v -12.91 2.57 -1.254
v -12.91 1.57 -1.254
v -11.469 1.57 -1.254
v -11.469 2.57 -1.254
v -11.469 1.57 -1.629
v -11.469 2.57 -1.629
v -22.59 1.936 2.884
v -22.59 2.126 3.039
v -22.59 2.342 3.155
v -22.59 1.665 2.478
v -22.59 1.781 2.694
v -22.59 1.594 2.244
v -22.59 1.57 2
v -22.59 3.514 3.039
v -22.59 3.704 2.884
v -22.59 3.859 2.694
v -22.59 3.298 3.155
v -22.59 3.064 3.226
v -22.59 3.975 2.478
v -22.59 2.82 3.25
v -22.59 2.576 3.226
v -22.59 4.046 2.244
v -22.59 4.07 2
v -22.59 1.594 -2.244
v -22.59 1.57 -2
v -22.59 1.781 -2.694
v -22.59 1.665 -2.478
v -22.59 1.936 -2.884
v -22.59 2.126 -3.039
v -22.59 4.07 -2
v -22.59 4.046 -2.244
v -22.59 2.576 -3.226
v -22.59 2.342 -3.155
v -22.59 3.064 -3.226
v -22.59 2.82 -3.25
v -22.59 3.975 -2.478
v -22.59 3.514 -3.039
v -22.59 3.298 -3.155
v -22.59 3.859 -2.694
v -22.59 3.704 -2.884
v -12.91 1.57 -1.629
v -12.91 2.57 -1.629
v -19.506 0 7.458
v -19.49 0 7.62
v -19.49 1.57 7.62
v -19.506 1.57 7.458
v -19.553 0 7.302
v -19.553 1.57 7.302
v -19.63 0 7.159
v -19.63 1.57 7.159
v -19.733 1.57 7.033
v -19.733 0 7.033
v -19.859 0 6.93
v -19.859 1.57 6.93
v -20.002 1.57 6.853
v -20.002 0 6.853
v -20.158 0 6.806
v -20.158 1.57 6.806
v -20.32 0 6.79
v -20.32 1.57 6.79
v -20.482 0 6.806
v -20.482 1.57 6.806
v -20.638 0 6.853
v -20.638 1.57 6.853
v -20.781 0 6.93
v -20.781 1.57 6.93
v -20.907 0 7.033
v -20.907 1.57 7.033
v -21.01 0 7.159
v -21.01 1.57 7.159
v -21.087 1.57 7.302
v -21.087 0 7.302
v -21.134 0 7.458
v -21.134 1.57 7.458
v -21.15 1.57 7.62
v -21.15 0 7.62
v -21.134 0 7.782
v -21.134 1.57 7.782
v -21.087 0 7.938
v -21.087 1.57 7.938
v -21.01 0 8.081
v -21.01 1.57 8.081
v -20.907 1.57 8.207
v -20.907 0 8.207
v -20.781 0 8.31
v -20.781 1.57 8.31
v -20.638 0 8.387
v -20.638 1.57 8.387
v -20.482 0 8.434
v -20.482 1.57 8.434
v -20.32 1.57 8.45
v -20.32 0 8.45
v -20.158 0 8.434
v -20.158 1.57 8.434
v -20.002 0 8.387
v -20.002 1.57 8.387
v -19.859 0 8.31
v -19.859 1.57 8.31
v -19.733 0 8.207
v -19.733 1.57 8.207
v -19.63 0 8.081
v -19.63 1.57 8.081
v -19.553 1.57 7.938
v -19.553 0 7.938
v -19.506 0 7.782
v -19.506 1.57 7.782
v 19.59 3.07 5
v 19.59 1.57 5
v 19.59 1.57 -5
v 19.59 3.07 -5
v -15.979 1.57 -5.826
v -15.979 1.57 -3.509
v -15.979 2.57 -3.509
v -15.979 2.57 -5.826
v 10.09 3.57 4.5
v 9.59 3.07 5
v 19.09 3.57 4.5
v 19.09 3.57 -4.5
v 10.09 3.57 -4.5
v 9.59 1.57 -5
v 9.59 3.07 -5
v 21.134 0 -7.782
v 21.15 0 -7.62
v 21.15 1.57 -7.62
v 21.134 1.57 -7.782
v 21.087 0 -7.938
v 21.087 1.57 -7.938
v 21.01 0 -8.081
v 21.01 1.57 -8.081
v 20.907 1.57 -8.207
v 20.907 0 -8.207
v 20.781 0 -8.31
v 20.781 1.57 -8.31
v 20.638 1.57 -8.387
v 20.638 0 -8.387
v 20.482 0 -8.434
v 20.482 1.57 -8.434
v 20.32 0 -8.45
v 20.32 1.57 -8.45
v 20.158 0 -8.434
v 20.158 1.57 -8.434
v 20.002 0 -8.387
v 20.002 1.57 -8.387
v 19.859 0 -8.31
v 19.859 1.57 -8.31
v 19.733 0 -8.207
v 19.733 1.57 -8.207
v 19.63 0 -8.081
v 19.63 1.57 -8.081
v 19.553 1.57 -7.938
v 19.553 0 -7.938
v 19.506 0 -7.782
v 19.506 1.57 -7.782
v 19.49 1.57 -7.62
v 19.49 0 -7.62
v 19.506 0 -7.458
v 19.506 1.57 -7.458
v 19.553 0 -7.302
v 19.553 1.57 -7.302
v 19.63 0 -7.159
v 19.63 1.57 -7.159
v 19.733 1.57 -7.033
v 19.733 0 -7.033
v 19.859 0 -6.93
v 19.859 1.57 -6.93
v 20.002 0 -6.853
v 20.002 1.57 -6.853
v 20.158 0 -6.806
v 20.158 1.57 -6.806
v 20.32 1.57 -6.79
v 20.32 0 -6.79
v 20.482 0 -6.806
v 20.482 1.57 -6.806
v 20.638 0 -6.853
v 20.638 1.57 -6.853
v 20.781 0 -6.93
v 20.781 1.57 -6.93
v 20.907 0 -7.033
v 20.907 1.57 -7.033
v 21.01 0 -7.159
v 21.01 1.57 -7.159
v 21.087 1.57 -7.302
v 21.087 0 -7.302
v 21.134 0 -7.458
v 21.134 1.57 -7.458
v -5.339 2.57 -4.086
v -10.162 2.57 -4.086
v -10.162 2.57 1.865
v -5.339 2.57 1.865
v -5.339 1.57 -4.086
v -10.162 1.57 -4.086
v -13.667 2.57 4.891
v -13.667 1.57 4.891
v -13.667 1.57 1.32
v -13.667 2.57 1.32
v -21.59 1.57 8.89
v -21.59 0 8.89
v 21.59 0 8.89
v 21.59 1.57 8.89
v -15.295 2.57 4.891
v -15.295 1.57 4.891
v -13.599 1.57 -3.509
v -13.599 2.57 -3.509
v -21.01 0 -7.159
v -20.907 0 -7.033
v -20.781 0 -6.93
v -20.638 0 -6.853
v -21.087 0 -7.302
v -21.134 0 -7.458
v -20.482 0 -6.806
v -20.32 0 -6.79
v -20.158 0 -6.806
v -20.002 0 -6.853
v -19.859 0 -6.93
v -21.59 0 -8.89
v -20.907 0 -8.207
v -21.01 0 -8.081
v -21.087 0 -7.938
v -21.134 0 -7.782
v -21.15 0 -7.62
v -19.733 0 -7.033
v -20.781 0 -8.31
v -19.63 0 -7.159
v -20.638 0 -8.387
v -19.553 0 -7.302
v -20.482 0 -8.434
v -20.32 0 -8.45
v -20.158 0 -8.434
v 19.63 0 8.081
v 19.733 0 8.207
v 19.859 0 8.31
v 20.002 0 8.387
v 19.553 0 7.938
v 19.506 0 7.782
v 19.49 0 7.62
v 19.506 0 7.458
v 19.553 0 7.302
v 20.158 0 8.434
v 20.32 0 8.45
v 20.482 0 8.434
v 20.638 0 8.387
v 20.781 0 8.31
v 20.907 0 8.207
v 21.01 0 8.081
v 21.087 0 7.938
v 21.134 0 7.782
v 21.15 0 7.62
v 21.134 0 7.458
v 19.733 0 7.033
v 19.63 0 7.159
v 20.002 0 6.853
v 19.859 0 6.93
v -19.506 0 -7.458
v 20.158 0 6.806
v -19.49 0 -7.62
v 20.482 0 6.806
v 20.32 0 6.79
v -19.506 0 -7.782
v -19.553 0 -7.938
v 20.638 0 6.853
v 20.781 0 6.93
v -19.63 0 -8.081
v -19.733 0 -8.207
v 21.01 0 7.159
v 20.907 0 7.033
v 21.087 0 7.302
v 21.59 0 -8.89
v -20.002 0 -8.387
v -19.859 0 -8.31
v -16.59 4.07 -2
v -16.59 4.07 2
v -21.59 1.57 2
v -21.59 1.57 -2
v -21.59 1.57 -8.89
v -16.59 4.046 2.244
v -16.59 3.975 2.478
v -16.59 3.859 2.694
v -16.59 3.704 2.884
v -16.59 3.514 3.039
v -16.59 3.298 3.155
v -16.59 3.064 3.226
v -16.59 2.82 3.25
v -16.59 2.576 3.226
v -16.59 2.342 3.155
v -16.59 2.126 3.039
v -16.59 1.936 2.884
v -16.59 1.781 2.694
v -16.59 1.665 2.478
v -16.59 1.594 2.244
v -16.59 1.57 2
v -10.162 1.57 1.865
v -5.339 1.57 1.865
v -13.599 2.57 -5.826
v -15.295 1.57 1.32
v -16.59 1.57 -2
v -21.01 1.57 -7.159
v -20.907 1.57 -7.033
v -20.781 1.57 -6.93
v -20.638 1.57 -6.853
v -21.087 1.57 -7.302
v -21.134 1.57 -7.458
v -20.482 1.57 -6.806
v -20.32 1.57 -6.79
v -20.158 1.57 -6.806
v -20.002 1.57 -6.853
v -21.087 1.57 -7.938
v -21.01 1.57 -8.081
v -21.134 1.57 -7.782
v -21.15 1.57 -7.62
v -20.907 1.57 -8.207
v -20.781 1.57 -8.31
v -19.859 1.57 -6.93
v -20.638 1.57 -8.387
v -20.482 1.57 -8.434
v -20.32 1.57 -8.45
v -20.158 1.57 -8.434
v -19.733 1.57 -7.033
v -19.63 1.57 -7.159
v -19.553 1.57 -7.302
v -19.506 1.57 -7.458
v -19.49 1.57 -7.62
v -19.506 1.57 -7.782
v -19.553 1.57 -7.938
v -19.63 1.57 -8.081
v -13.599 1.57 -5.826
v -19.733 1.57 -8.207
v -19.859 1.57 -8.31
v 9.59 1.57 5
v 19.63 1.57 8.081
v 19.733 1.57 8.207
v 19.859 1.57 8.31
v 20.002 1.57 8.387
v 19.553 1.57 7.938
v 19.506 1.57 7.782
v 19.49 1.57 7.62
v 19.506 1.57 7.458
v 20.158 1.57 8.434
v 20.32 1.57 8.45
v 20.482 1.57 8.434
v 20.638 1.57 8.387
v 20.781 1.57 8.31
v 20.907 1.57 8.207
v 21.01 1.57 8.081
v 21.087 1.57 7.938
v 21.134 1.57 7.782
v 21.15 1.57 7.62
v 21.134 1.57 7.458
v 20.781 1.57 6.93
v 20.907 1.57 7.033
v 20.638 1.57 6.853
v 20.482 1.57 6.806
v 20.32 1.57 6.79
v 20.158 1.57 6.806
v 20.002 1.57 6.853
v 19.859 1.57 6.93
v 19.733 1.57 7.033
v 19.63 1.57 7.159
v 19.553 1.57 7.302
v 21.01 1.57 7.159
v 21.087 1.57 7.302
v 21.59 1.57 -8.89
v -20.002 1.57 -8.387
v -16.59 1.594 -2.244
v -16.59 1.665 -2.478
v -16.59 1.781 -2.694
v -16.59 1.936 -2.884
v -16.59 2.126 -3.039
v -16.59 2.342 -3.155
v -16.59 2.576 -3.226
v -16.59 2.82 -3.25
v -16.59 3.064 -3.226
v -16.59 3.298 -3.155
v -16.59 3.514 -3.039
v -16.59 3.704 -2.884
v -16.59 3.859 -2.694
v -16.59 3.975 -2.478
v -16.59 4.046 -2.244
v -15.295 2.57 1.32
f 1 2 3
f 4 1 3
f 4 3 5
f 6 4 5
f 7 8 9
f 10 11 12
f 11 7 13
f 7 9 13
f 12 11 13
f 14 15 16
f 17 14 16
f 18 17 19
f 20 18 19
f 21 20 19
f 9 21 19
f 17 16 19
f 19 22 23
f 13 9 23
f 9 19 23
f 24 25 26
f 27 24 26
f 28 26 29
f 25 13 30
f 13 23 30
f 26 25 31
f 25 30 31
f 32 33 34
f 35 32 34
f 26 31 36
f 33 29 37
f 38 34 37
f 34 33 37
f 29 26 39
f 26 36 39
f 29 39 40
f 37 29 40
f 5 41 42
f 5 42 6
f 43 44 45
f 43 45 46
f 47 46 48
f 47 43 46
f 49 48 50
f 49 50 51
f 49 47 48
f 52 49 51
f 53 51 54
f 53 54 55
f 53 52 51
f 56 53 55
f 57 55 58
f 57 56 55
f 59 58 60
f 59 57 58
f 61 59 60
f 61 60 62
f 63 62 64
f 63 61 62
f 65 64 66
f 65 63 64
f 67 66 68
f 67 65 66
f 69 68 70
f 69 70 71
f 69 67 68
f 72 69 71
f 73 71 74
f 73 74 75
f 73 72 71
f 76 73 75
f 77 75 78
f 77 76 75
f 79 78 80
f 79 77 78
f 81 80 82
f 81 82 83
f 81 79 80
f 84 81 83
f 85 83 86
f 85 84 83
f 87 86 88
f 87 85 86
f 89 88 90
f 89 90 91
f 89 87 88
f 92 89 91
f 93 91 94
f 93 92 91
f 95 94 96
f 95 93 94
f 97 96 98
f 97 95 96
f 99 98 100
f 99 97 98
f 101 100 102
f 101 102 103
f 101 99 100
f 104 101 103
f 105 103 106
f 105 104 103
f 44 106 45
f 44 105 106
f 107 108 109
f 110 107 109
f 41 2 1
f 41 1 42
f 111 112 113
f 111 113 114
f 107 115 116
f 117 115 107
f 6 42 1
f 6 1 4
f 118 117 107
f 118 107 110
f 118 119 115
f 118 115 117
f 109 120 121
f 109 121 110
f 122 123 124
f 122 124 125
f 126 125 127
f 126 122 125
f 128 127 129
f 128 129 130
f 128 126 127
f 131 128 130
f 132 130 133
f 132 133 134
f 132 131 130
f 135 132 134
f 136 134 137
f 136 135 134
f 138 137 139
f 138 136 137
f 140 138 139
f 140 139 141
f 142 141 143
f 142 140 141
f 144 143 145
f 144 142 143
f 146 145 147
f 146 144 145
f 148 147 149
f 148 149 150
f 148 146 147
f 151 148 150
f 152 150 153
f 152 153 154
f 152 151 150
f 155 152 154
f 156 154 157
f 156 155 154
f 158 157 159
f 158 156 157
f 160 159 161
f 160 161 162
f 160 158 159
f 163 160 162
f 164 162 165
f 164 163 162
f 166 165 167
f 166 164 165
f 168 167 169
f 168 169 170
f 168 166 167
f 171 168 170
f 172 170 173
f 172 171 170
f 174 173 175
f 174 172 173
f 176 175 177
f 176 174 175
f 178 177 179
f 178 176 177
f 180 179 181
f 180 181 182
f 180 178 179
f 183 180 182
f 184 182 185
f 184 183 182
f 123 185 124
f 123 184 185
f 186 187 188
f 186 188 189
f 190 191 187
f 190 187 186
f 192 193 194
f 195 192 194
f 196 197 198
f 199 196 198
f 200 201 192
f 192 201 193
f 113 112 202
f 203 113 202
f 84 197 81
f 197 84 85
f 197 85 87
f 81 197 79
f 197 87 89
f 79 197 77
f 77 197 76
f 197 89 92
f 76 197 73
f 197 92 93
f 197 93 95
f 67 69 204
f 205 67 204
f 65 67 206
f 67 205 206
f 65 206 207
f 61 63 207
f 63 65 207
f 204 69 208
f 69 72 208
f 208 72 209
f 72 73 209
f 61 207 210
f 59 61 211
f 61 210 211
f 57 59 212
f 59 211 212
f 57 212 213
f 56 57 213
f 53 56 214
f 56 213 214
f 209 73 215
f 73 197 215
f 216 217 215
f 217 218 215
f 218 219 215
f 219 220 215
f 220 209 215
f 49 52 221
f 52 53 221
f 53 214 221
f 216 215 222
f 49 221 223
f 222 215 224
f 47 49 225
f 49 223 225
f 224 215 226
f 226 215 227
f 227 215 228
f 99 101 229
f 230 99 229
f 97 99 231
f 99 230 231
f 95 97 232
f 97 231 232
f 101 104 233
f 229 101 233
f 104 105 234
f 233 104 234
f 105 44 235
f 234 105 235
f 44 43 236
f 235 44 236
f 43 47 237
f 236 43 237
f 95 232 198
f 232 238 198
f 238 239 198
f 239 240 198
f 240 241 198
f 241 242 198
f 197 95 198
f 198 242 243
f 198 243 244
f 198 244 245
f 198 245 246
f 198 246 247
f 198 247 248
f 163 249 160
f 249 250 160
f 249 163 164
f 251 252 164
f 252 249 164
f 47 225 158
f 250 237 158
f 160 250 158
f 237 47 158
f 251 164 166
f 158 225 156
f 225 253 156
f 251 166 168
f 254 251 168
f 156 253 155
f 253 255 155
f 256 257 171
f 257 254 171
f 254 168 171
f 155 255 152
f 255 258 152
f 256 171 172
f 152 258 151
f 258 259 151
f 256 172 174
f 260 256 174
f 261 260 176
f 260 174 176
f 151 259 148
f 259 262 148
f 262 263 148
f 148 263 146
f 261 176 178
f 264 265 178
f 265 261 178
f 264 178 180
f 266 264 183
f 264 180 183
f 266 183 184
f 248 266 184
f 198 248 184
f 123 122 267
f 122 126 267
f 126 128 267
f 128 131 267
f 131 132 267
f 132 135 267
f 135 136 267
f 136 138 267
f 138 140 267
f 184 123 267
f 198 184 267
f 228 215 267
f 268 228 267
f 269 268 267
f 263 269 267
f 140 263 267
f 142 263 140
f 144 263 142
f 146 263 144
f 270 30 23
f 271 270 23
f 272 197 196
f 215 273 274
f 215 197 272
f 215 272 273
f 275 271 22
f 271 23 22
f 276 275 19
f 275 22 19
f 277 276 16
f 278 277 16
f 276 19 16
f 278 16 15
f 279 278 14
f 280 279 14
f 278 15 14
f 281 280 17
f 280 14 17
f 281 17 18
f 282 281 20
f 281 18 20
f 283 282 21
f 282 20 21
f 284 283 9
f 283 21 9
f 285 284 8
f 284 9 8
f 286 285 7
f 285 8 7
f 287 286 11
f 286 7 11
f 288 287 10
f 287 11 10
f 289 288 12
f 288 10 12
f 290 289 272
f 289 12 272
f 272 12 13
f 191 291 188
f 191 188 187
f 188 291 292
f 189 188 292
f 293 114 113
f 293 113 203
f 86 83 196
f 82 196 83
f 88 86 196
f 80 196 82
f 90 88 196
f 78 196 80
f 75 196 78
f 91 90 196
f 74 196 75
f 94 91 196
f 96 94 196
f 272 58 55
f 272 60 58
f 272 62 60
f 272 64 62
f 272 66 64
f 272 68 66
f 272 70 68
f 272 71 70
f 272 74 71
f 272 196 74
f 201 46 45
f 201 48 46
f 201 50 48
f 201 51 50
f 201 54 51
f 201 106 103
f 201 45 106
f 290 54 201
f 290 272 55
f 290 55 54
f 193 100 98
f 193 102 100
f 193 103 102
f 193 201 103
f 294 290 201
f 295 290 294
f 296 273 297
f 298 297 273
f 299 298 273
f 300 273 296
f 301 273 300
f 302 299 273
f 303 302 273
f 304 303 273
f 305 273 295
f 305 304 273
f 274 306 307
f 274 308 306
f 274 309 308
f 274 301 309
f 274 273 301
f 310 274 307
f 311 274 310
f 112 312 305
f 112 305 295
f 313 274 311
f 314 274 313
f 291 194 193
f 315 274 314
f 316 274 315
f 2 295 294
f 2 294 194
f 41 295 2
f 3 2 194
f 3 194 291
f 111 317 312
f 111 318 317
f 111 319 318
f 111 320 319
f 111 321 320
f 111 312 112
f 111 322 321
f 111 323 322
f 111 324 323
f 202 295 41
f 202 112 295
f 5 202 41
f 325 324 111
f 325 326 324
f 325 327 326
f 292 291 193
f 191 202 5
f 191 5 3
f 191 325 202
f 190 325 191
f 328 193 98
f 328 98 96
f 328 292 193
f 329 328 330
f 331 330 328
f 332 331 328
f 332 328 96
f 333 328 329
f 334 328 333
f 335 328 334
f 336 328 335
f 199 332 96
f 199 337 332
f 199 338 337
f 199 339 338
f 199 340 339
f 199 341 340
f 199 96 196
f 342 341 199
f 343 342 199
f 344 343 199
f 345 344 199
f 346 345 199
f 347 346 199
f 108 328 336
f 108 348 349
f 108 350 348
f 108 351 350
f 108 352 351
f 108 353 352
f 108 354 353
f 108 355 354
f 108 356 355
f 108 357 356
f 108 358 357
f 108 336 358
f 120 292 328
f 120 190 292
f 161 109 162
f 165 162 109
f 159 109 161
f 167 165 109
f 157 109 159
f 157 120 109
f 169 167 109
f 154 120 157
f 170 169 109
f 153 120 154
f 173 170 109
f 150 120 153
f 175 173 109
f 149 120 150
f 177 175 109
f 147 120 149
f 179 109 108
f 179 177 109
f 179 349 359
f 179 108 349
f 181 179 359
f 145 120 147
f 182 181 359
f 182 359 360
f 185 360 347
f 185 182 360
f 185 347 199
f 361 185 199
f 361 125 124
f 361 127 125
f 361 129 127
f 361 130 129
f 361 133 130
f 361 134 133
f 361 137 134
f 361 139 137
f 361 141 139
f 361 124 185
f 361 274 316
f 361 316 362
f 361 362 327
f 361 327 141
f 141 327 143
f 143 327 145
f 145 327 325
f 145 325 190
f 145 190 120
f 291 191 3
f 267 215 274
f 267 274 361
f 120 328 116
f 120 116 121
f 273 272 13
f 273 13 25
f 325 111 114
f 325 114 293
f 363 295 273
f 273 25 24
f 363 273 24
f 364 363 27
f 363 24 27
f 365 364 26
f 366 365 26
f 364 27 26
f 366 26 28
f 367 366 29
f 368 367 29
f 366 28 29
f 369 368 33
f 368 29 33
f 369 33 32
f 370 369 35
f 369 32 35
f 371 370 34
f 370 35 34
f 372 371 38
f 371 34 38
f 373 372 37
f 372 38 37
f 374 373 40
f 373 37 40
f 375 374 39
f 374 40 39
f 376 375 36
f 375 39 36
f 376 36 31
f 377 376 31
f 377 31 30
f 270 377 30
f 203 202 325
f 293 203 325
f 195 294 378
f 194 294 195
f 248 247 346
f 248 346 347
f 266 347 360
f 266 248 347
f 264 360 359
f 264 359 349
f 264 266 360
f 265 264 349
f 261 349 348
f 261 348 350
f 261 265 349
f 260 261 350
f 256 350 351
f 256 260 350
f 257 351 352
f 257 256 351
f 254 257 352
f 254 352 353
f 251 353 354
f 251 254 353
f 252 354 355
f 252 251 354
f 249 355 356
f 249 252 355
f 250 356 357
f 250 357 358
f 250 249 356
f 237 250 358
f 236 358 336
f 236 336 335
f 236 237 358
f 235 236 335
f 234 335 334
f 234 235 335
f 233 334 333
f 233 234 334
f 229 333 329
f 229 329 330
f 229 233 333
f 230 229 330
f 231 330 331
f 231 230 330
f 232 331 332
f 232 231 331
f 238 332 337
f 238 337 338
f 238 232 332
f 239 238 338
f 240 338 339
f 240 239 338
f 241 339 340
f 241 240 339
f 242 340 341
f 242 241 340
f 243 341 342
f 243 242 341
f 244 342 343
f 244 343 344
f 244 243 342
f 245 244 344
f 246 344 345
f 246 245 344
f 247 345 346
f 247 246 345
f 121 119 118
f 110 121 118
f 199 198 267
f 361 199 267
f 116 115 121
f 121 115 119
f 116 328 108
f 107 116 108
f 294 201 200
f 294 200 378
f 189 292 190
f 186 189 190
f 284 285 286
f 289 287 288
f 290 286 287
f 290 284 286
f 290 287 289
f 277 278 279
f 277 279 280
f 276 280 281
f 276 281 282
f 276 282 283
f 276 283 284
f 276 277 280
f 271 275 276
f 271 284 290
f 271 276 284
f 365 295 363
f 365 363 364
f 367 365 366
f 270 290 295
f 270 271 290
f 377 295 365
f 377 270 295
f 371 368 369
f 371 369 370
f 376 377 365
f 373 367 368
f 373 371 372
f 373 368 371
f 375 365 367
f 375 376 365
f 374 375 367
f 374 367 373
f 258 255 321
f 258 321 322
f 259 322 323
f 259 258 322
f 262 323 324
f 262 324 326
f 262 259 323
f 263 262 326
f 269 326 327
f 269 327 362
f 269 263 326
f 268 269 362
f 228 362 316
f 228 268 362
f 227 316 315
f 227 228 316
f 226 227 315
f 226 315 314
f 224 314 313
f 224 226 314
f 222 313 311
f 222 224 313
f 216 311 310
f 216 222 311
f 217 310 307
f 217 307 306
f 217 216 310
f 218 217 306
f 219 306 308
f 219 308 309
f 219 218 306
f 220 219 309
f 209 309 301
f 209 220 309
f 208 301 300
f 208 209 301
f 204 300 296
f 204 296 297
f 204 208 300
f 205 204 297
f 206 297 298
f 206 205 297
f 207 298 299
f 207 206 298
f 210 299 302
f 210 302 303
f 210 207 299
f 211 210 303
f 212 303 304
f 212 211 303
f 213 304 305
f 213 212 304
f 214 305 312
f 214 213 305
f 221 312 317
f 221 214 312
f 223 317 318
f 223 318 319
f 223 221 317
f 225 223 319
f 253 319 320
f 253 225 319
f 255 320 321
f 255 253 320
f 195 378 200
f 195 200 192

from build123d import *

# Parameters (mm, degrees)
SKETCH1_W                = 43.18
SKETCH1_H                = 17.78
SKETCH1_R                = 0.83
BOSS_EXTRUDE1_DEPTH      = 1.57
SKETCH2_W                = 10
SKETCH2_H                = 10
BOSS_EXTRUDE2_DEPTH      = 2
CHAMFER1_SIZE            = 0.5
BOSS_EXTRUDE3_DEPTH      = 1
BOSS_EXTRUDE3_DEPTH_BACK = 5
SKETCH4_W                = 2.380224585
SKETCH4_H                = 2.317587096
SKETCH4_W_2              = 1.628574716
SKETCH4_H_2              = 3.570336877
SKETCH4_W_3              = 4.823086659
SKETCH4_H_3              = 5.950561462
SKETCH4_W_4              = 1.440662249
SKETCH4_H_4              = 0.375824935
BOSS_EXTRUDE4_DEPTH      = 1


with BuildPart() as part:
    # Sketch1 → Boss-Extrude1 (new body)
    with BuildSketch(Plane(origin=(0, 0, 0), x_dir=(1, 0, 0), z_dir=(0, 1, 0))):
        Rectangle(SKETCH1_W, SKETCH1_H)
        with Locations((-20.32, 7.62)):
            Circle(SKETCH1_R, mode=Mode.SUBTRACT)
        with Locations((20.32, 7.62)):
            Circle(SKETCH1_R, mode=Mode.SUBTRACT)
        with Locations((20.32, -7.62)):
            Circle(SKETCH1_R, mode=Mode.SUBTRACT)
        with Locations((-20.32, -7.62)):
            Circle(SKETCH1_R, mode=Mode.SUBTRACT)
    extrude(amount=BOSS_EXTRUDE1_DEPTH)

    # Sketch2 → Boss-Extrude2 (add)
    with BuildSketch(Plane(origin=(0, 1.57, 0), x_dir=(1, 0, 0), z_dir=(0, 1, 0))):
        with Locations((14.59, 0)):
            Rectangle(SKETCH2_W, SKETCH2_H)
    extrude(amount=BOSS_EXTRUDE2_DEPTH)

    # Chamfer1
    chamfer1_edges = [part.edges().sort_by_distance(p)[0] for p in [
        (9.59, 3.57, 0),
        (14.59, 3.57, 5),
        (19.59, 3.57, 0),
        (14.59, 3.57, -5),
    ]]
    chamfer(chamfer1_edges, length=CHAMFER1_SIZE)

    # Sketch3 → Boss-Extrude3 (add, two sides)
    with BuildSketch(Plane.ZY.offset(21.59)) as boss_extrude3_sk:
        with BuildLine():
            Line((-2, 4.07), (2, 4.07))
            ThreePointArc((2, 4.07), (3.25, 2.82), (2, 1.57))
            Line((2, 1.57), (-2, 1.57))
            ThreePointArc((-2, 1.57), (-3.25, 2.82), (-2, 4.07))
        make_face()
    extrude(amount=BOSS_EXTRUDE3_DEPTH)
    extrude(boss_extrude3_sk.sketch, amount=-BOSS_EXTRUDE3_DEPTH_BACK)

    # Sketch4 → Boss-Extrude4 (add)
    with BuildSketch(Plane(origin=(0, 1.57, 0), x_dir=(1, 0, 0), z_dir=(0, 1, 0))):
        with Locations((-14.788997849, 4.667413541)):
            Rectangle(SKETCH4_W, SKETCH4_H)
        with Locations((-14.480791416, -3.105550682)):
            Rectangle(SKETCH4_W_2, SKETCH4_H_2)
        with Locations((-7.750249949, 1.110525399)):
            Rectangle(SKETCH4_W_3, SKETCH4_H_3)
        with Locations((-12.189542052, 1.441582853)):
            Rectangle(SKETCH4_W_4, SKETCH4_H_4)
    extrude(amount=BOSS_EXTRUDE4_DEPTH)


solid = part.part
